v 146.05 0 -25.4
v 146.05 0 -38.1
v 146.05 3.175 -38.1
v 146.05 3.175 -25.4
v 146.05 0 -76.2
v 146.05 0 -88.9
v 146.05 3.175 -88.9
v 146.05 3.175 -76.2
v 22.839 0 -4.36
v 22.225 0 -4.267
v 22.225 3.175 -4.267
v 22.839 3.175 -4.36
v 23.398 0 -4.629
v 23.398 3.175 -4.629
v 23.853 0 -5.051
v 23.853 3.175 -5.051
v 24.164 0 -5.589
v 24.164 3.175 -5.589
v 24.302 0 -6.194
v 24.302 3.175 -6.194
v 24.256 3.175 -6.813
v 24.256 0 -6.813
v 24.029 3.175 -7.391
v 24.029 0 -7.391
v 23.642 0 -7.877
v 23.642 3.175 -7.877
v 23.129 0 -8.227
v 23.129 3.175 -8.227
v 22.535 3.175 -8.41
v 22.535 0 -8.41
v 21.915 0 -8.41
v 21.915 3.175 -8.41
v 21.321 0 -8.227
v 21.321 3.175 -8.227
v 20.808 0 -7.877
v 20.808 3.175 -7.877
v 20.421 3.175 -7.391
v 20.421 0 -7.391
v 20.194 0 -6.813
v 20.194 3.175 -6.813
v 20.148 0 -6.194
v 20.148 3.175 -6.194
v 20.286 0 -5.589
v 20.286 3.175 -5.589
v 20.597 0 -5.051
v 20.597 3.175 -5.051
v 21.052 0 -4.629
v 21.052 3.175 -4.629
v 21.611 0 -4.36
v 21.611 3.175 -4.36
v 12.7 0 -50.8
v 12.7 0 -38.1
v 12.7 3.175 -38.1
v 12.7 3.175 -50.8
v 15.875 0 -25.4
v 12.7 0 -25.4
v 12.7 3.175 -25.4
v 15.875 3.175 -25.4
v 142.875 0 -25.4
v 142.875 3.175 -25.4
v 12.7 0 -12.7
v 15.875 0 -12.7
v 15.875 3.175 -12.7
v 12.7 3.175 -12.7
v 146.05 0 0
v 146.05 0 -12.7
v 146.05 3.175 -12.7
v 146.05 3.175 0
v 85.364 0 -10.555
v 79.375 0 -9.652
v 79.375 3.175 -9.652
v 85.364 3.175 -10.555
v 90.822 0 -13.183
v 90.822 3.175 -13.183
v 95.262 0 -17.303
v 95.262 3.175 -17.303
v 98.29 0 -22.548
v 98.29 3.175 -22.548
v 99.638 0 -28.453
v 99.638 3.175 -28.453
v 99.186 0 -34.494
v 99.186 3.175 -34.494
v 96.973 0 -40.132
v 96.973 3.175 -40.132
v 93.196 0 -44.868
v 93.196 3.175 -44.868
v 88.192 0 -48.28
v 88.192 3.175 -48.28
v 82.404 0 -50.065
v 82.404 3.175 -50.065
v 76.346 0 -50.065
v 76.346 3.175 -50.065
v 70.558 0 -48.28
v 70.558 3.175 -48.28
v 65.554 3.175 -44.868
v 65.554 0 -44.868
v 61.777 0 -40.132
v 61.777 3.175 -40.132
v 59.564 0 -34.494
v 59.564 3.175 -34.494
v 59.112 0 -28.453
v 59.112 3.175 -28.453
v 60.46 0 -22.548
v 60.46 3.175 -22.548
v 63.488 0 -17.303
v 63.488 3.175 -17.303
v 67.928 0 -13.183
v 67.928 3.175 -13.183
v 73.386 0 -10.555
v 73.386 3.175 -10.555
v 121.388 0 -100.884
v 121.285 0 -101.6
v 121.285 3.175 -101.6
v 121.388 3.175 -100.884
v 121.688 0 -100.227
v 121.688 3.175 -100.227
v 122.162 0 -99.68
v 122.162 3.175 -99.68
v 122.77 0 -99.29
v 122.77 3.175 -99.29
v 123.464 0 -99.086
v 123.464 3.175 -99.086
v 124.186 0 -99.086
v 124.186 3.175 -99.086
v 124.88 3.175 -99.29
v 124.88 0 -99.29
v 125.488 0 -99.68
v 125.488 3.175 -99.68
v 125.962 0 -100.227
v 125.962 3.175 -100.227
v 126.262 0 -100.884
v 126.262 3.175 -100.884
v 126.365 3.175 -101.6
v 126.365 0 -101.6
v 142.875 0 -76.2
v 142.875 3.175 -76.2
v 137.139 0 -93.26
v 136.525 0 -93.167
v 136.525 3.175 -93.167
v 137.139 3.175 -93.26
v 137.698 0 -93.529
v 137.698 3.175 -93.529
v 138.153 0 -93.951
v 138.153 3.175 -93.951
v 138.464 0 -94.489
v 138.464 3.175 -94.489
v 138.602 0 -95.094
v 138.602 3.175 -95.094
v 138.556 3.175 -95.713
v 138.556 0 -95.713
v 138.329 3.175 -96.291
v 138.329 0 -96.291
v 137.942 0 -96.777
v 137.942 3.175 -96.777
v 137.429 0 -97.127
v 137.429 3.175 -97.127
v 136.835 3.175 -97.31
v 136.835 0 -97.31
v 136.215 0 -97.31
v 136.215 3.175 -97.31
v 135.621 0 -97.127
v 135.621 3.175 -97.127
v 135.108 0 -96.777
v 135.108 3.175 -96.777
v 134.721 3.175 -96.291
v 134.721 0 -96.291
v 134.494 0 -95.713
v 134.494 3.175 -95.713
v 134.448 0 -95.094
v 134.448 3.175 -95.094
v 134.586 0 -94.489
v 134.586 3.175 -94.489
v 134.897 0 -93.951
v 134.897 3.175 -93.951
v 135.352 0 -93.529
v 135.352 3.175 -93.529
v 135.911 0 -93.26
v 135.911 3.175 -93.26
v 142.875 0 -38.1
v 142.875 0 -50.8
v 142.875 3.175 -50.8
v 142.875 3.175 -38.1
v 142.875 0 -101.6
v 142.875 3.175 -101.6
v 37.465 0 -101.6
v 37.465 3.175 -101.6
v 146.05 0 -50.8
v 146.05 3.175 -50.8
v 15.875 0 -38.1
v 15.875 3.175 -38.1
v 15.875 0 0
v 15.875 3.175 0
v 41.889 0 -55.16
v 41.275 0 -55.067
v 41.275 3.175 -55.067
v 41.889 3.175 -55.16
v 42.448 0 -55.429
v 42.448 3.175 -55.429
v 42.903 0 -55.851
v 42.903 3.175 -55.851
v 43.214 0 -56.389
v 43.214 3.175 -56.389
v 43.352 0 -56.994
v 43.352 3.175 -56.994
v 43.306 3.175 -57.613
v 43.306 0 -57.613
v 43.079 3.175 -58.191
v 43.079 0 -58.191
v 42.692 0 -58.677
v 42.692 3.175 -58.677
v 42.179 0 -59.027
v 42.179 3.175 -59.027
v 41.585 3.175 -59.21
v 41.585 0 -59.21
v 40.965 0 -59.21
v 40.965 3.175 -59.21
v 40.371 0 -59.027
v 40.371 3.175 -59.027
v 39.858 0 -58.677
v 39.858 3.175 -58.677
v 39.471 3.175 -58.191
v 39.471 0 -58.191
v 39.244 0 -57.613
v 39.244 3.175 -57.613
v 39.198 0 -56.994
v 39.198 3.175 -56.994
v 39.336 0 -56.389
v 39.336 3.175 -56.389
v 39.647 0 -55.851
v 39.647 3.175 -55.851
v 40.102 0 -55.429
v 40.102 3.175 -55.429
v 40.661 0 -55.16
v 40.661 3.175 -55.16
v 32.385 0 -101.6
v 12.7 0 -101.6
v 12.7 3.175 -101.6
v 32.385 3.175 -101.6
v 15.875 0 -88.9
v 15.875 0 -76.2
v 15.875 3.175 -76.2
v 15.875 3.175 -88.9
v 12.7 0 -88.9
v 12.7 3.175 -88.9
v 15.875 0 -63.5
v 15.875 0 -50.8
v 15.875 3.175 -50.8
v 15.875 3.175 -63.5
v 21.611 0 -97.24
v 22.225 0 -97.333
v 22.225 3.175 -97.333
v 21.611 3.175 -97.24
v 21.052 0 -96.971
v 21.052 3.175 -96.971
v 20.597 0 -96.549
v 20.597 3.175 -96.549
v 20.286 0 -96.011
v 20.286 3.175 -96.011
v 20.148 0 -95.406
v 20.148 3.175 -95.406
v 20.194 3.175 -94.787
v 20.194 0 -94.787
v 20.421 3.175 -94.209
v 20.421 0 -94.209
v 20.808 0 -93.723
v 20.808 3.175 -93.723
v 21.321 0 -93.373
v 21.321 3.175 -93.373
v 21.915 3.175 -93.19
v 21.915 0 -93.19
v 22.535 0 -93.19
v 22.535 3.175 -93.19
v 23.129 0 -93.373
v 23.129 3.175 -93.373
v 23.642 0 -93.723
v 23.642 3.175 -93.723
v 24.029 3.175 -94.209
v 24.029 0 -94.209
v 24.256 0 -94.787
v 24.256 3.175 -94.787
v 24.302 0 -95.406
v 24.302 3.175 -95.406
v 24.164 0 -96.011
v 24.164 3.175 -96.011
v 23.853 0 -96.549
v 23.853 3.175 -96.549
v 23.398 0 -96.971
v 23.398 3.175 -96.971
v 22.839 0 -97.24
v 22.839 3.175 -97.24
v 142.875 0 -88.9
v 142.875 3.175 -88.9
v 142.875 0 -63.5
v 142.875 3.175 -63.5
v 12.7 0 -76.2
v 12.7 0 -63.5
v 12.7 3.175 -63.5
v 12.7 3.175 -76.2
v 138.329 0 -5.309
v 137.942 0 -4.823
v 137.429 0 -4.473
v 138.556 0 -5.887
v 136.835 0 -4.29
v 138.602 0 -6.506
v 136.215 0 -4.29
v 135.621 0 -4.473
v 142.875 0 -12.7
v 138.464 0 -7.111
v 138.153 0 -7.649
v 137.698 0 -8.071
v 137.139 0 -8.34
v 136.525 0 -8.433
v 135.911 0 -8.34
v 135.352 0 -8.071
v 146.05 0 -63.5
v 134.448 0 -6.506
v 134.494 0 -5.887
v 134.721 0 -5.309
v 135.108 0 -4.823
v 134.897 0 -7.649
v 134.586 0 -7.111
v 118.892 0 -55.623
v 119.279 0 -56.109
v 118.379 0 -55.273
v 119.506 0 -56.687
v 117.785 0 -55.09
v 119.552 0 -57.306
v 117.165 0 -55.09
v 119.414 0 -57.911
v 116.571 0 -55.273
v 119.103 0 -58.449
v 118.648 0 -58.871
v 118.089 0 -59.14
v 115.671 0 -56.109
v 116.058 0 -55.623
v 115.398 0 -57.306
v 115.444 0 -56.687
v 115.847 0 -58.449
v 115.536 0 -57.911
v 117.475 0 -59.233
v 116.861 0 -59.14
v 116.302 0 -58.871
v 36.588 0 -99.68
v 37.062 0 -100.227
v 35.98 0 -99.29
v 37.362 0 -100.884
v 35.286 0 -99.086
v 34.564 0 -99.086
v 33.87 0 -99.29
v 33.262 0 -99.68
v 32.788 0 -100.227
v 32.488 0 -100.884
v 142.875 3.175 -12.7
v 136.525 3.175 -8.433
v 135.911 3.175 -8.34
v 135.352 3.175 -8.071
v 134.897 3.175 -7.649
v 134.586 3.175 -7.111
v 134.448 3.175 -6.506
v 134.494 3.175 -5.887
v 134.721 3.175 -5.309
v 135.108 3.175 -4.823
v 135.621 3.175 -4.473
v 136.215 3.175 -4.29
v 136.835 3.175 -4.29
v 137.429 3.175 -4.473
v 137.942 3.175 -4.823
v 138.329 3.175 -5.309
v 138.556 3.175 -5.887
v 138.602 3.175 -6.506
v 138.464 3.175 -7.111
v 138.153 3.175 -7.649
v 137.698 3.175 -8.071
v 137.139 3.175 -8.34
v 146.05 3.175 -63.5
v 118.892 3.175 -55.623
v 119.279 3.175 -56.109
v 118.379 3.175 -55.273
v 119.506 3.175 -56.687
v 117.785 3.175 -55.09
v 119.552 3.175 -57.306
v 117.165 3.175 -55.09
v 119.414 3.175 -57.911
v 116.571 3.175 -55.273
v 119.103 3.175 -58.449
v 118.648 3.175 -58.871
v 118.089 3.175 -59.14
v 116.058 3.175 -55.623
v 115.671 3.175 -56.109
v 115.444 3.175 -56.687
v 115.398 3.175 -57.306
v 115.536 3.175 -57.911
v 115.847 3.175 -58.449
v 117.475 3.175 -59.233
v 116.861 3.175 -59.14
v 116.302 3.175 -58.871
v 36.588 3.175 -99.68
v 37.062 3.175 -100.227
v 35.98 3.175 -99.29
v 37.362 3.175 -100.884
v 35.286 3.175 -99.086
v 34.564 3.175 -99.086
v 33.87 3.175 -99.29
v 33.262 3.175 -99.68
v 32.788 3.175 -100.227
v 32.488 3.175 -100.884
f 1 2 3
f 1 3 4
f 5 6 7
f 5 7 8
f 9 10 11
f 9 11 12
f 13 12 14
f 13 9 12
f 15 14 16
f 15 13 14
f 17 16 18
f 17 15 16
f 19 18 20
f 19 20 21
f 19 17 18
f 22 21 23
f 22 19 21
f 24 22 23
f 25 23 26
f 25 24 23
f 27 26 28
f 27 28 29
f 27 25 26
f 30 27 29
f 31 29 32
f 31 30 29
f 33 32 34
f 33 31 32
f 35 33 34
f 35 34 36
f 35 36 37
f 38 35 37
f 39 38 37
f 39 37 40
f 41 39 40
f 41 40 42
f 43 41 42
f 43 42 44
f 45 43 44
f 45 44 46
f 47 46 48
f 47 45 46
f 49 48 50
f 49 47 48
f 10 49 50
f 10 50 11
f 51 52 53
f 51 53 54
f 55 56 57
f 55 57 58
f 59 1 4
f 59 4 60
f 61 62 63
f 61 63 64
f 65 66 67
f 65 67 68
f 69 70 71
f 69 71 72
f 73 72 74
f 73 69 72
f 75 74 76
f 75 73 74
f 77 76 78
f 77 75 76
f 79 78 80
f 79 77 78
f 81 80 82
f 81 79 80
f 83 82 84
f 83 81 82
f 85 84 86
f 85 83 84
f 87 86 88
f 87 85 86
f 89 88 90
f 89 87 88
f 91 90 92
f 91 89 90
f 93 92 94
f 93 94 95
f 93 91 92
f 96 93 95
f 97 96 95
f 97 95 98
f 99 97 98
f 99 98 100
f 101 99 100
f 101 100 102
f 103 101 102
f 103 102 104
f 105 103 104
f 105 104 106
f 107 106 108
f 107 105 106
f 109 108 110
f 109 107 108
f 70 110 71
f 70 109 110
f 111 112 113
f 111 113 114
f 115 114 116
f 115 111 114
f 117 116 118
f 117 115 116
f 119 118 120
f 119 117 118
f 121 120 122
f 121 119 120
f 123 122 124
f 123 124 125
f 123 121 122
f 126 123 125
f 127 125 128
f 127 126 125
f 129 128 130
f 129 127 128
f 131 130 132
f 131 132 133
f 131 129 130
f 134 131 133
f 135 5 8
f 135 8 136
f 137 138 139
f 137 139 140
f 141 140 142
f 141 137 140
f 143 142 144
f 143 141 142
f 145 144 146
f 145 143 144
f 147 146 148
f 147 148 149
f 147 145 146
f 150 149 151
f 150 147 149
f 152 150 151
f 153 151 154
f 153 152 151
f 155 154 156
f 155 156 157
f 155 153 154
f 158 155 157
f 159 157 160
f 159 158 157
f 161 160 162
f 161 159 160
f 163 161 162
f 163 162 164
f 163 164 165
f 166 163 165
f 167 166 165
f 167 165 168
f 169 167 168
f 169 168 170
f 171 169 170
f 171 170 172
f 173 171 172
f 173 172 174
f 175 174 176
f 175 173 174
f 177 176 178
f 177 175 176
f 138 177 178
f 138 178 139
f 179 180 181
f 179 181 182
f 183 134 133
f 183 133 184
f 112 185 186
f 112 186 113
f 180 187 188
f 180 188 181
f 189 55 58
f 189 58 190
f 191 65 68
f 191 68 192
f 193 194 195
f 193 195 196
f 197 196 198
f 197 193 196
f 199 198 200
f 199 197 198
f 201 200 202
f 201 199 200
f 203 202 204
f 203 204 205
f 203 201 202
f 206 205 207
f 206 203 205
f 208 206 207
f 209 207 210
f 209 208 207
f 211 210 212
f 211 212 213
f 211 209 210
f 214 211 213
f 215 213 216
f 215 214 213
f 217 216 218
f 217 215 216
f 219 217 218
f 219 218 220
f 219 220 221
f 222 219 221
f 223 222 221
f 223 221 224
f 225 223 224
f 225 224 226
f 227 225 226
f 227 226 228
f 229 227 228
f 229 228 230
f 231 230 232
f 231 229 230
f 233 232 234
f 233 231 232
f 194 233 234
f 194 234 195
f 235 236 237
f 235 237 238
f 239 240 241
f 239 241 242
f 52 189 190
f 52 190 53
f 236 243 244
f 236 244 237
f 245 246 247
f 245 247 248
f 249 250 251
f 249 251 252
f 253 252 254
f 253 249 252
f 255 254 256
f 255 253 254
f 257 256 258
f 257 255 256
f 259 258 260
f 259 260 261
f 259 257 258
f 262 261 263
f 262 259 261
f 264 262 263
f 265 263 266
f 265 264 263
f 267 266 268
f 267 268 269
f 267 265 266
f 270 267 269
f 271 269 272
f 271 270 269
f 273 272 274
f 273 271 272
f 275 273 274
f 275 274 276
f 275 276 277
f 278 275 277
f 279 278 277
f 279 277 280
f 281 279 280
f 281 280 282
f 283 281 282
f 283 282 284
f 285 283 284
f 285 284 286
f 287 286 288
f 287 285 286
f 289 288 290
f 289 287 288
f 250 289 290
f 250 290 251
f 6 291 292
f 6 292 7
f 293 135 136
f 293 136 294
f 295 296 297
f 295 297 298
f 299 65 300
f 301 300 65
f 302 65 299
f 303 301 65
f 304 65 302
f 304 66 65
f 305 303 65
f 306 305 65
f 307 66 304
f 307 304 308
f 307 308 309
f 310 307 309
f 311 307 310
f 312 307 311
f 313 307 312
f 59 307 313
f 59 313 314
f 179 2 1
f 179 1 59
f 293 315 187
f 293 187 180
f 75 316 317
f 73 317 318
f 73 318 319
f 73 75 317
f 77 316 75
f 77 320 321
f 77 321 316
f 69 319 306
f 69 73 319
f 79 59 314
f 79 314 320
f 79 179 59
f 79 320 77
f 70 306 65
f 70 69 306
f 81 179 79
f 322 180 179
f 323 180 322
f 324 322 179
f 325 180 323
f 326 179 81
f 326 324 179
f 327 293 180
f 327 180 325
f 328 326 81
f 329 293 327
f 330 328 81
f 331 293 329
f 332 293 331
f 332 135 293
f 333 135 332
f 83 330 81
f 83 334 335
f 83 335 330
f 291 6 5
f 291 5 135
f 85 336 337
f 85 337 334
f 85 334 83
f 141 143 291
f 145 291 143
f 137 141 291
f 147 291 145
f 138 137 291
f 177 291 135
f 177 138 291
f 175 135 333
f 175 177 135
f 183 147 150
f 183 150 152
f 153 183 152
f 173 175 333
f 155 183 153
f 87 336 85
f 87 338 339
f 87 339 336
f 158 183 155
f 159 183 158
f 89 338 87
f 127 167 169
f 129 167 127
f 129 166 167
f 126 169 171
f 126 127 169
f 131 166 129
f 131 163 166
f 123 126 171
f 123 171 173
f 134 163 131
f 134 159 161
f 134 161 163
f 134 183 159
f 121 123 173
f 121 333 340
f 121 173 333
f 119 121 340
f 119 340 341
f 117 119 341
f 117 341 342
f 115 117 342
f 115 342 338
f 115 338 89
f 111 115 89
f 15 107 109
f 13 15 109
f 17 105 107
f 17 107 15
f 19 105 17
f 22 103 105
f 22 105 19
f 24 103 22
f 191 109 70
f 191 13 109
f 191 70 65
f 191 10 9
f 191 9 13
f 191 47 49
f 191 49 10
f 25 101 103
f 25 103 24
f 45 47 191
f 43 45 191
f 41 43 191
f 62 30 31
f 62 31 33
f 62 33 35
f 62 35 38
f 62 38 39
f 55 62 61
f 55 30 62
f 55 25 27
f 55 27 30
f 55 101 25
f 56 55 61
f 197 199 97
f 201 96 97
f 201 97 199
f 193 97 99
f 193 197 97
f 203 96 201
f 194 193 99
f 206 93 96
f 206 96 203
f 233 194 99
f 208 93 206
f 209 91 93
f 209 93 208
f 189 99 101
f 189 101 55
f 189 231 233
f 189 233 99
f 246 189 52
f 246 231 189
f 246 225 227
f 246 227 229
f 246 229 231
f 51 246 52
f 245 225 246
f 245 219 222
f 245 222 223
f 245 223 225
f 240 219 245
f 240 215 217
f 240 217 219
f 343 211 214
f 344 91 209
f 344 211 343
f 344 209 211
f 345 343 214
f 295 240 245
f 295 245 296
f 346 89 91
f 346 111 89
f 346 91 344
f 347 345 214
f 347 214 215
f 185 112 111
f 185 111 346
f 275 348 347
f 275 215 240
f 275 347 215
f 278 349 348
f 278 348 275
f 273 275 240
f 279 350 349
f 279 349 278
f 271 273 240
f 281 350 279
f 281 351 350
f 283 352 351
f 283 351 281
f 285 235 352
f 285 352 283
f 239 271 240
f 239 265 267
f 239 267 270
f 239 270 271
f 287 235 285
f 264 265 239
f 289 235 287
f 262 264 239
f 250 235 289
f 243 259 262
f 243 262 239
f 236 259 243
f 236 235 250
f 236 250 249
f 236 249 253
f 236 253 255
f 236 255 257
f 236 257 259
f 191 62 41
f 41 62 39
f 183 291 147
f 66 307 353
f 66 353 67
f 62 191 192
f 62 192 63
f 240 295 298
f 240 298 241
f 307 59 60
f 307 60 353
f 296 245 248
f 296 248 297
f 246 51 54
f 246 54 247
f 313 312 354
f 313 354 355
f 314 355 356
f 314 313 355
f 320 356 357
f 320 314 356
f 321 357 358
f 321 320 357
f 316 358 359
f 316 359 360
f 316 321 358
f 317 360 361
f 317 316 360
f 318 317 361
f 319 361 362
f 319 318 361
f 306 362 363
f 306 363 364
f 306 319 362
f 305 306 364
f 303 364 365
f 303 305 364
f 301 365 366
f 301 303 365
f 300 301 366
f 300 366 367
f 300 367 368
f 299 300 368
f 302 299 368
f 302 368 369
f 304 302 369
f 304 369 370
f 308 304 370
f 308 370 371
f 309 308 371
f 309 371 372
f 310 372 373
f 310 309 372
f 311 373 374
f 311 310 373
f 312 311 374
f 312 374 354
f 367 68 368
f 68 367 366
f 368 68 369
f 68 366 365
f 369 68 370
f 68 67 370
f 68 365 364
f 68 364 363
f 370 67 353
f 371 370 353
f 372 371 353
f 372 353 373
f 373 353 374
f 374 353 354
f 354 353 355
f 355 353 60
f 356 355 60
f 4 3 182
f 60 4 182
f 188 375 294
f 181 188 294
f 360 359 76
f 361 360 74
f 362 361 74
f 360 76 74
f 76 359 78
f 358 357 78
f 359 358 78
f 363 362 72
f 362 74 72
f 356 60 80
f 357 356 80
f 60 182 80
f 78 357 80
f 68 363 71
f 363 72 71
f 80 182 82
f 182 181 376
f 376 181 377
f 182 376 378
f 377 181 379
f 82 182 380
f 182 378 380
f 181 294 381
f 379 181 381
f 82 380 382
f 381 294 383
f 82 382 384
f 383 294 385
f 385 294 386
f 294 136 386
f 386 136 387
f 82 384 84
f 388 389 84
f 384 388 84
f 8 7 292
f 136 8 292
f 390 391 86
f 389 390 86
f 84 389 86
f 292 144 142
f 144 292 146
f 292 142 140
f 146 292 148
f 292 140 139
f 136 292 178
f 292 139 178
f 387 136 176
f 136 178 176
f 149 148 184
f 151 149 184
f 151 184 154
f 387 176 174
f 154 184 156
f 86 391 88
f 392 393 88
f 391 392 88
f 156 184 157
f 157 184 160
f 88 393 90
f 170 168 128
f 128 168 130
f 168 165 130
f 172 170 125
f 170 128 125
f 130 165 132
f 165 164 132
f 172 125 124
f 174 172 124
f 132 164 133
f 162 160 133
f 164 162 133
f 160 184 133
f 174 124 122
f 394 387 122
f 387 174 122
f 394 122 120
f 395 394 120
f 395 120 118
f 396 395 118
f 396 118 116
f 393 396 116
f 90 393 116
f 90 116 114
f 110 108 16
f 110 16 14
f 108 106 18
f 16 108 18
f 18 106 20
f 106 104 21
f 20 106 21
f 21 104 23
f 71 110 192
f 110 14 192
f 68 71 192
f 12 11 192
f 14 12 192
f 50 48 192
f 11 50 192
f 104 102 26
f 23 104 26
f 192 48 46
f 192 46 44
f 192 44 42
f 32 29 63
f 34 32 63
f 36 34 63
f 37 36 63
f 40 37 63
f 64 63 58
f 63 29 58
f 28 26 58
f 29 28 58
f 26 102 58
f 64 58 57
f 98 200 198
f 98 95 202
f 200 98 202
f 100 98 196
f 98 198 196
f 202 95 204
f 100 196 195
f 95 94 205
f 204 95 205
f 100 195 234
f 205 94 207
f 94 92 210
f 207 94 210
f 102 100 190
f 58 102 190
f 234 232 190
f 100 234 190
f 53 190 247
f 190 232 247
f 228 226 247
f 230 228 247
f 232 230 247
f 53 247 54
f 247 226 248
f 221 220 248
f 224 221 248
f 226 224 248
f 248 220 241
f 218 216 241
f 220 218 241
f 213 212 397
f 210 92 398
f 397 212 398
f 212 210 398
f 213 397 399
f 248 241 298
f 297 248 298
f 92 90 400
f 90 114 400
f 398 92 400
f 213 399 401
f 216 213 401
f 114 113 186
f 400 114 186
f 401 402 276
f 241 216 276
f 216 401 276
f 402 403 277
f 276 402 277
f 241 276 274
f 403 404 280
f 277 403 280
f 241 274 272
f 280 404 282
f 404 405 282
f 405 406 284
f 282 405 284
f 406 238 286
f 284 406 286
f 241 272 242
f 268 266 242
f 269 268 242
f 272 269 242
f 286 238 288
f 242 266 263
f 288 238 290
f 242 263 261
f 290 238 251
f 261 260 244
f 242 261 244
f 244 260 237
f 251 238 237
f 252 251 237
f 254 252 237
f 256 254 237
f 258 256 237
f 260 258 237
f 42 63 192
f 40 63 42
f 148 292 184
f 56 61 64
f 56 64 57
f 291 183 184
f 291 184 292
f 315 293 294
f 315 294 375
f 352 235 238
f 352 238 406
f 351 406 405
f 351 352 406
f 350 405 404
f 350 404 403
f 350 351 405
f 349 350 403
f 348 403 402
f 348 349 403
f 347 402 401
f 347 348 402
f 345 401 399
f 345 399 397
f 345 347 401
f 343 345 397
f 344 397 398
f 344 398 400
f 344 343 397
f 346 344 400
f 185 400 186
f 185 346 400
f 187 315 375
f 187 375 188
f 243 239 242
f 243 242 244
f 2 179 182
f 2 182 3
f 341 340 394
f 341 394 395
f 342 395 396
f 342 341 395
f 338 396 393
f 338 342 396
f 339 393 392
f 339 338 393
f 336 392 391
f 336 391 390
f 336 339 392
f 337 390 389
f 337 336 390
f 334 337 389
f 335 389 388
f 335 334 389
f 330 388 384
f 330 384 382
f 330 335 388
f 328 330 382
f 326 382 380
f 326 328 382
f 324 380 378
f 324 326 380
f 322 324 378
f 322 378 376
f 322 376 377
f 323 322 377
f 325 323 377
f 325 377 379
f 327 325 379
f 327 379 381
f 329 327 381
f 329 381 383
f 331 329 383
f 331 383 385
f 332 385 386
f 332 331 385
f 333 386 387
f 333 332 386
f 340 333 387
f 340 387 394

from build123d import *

# Parameters (mm, degrees)
SKETCH2_R           = 2.0828
SKETCH2_R_2         = 20.32
BOSS_EXTRUDE1_DEPTH = 3.175


with BuildPart() as part:
    # Sketch2 → Boss-Extrude1 (new body)
    with BuildSketch(Plane(origin=(0, 0, 0), x_dir=(1, 0, 0), z_dir=(0, 1, 0))):
        with BuildLine():
            Line((15.875, 0), (15.875, 12.7))
            Line((15.875, 12.7), (12.7, 12.7))
            Line((12.7, 12.7), (12.7, 25.4))
            Line((12.7, 25.4), (15.875, 25.4))
            Line((15.875, 25.4), (15.875, 38.1))
            Line((15.875, 38.1), (12.7, 38.1))
            Line((12.7, 38.1), (12.7, 50.8))
            Line((12.7, 50.8), (15.875, 50.8))
            Line((15.875, 50.8), (15.875, 63.5))
            Line((15.875, 63.5), (12.7, 63.5))
            Line((12.7, 63.5), (12.7, 76.2))
            Line((12.7, 76.2), (15.875, 76.2))
            Line((15.875, 76.2), (15.875, 88.9))
            Line((15.875, 88.9), (12.7, 88.9))
            Line((12.7, 88.9), (12.7, 101.6))
            Line((12.7, 101.6), (15.875, 101.6))
            Line((15.875, 101.6), (32.385, 101.6))
            ThreePointArc((32.385, 101.6), (34.925, 99.06), (37.465, 101.6))
            Line((37.465, 101.6), (121.285, 101.6))
            ThreePointArc((121.285, 101.6), (123.825, 99.06), (126.365, 101.6))
            Line((126.365, 101.6), (142.875, 101.6))
            Line((142.875, 101.6), (142.875, 88.9))
            Line((142.875, 88.9), (146.05, 88.9))
            Line((146.05, 88.9), (146.05, 76.2))
            Line((146.05, 76.2), (142.875, 76.2))
            Line((142.875, 76.2), (142.875, 63.5))
            Line((142.875, 63.5), (146.05, 63.5))
            Line((146.05, 63.5), (146.05, 50.8))
            Line((146.05, 50.8), (142.875, 50.8))
            Line((142.875, 50.8), (142.875, 38.1))
            Line((142.875, 38.1), (146.05, 38.1))
            Line((146.05, 38.1), (146.05, 25.4))
            Line((146.05, 25.4), (142.875, 25.4))
            Line((142.875, 25.4), (142.875, 12.7))
            Line((142.875, 12.7), (146.05, 12.7))
            Line((146.05, 12.7), (146.05, 0))
            Line((146.05, 0), (15.875, 0))
        make_face()
        with Locations(Location((41.275, 57.15, 0), (0, 0, 270))):
            Circle(SKETCH2_R, mode=Mode.SUBTRACT)
        with Locations(Location((136.525, 6.35, 0), (0, 0, 90))):
            Circle(SKETCH2_R, mode=Mode.SUBTRACT)
        with Locations(Location((79.375, 29.972, 0), (0, 0, 270))):
            Circle(SKETCH2_R_2, mode=Mode.SUBTRACT)
        with Locations(Location((22.225, 6.35, 0), (0, 0, 270))):
            Circle(SKETCH2_R, mode=Mode.SUBTRACT)
        with Locations(Location((117.475, 57.15, 0), (0, 0, 90))):
            Circle(SKETCH2_R, mode=Mode.SUBTRACT)
        with Locations(Location((22.225, 95.25, 0), (0, 0, 90))):
            Circle(SKETCH2_R, mode=Mode.SUBTRACT)
        with Locations(Location((136.525, 95.25, 0), (0, 0, 270))):
            Circle(SKETCH2_R, mode=Mode.SUBTRACT)
    extrude(amount=BOSS_EXTRUDE1_DEPTH)


solid = part.part
